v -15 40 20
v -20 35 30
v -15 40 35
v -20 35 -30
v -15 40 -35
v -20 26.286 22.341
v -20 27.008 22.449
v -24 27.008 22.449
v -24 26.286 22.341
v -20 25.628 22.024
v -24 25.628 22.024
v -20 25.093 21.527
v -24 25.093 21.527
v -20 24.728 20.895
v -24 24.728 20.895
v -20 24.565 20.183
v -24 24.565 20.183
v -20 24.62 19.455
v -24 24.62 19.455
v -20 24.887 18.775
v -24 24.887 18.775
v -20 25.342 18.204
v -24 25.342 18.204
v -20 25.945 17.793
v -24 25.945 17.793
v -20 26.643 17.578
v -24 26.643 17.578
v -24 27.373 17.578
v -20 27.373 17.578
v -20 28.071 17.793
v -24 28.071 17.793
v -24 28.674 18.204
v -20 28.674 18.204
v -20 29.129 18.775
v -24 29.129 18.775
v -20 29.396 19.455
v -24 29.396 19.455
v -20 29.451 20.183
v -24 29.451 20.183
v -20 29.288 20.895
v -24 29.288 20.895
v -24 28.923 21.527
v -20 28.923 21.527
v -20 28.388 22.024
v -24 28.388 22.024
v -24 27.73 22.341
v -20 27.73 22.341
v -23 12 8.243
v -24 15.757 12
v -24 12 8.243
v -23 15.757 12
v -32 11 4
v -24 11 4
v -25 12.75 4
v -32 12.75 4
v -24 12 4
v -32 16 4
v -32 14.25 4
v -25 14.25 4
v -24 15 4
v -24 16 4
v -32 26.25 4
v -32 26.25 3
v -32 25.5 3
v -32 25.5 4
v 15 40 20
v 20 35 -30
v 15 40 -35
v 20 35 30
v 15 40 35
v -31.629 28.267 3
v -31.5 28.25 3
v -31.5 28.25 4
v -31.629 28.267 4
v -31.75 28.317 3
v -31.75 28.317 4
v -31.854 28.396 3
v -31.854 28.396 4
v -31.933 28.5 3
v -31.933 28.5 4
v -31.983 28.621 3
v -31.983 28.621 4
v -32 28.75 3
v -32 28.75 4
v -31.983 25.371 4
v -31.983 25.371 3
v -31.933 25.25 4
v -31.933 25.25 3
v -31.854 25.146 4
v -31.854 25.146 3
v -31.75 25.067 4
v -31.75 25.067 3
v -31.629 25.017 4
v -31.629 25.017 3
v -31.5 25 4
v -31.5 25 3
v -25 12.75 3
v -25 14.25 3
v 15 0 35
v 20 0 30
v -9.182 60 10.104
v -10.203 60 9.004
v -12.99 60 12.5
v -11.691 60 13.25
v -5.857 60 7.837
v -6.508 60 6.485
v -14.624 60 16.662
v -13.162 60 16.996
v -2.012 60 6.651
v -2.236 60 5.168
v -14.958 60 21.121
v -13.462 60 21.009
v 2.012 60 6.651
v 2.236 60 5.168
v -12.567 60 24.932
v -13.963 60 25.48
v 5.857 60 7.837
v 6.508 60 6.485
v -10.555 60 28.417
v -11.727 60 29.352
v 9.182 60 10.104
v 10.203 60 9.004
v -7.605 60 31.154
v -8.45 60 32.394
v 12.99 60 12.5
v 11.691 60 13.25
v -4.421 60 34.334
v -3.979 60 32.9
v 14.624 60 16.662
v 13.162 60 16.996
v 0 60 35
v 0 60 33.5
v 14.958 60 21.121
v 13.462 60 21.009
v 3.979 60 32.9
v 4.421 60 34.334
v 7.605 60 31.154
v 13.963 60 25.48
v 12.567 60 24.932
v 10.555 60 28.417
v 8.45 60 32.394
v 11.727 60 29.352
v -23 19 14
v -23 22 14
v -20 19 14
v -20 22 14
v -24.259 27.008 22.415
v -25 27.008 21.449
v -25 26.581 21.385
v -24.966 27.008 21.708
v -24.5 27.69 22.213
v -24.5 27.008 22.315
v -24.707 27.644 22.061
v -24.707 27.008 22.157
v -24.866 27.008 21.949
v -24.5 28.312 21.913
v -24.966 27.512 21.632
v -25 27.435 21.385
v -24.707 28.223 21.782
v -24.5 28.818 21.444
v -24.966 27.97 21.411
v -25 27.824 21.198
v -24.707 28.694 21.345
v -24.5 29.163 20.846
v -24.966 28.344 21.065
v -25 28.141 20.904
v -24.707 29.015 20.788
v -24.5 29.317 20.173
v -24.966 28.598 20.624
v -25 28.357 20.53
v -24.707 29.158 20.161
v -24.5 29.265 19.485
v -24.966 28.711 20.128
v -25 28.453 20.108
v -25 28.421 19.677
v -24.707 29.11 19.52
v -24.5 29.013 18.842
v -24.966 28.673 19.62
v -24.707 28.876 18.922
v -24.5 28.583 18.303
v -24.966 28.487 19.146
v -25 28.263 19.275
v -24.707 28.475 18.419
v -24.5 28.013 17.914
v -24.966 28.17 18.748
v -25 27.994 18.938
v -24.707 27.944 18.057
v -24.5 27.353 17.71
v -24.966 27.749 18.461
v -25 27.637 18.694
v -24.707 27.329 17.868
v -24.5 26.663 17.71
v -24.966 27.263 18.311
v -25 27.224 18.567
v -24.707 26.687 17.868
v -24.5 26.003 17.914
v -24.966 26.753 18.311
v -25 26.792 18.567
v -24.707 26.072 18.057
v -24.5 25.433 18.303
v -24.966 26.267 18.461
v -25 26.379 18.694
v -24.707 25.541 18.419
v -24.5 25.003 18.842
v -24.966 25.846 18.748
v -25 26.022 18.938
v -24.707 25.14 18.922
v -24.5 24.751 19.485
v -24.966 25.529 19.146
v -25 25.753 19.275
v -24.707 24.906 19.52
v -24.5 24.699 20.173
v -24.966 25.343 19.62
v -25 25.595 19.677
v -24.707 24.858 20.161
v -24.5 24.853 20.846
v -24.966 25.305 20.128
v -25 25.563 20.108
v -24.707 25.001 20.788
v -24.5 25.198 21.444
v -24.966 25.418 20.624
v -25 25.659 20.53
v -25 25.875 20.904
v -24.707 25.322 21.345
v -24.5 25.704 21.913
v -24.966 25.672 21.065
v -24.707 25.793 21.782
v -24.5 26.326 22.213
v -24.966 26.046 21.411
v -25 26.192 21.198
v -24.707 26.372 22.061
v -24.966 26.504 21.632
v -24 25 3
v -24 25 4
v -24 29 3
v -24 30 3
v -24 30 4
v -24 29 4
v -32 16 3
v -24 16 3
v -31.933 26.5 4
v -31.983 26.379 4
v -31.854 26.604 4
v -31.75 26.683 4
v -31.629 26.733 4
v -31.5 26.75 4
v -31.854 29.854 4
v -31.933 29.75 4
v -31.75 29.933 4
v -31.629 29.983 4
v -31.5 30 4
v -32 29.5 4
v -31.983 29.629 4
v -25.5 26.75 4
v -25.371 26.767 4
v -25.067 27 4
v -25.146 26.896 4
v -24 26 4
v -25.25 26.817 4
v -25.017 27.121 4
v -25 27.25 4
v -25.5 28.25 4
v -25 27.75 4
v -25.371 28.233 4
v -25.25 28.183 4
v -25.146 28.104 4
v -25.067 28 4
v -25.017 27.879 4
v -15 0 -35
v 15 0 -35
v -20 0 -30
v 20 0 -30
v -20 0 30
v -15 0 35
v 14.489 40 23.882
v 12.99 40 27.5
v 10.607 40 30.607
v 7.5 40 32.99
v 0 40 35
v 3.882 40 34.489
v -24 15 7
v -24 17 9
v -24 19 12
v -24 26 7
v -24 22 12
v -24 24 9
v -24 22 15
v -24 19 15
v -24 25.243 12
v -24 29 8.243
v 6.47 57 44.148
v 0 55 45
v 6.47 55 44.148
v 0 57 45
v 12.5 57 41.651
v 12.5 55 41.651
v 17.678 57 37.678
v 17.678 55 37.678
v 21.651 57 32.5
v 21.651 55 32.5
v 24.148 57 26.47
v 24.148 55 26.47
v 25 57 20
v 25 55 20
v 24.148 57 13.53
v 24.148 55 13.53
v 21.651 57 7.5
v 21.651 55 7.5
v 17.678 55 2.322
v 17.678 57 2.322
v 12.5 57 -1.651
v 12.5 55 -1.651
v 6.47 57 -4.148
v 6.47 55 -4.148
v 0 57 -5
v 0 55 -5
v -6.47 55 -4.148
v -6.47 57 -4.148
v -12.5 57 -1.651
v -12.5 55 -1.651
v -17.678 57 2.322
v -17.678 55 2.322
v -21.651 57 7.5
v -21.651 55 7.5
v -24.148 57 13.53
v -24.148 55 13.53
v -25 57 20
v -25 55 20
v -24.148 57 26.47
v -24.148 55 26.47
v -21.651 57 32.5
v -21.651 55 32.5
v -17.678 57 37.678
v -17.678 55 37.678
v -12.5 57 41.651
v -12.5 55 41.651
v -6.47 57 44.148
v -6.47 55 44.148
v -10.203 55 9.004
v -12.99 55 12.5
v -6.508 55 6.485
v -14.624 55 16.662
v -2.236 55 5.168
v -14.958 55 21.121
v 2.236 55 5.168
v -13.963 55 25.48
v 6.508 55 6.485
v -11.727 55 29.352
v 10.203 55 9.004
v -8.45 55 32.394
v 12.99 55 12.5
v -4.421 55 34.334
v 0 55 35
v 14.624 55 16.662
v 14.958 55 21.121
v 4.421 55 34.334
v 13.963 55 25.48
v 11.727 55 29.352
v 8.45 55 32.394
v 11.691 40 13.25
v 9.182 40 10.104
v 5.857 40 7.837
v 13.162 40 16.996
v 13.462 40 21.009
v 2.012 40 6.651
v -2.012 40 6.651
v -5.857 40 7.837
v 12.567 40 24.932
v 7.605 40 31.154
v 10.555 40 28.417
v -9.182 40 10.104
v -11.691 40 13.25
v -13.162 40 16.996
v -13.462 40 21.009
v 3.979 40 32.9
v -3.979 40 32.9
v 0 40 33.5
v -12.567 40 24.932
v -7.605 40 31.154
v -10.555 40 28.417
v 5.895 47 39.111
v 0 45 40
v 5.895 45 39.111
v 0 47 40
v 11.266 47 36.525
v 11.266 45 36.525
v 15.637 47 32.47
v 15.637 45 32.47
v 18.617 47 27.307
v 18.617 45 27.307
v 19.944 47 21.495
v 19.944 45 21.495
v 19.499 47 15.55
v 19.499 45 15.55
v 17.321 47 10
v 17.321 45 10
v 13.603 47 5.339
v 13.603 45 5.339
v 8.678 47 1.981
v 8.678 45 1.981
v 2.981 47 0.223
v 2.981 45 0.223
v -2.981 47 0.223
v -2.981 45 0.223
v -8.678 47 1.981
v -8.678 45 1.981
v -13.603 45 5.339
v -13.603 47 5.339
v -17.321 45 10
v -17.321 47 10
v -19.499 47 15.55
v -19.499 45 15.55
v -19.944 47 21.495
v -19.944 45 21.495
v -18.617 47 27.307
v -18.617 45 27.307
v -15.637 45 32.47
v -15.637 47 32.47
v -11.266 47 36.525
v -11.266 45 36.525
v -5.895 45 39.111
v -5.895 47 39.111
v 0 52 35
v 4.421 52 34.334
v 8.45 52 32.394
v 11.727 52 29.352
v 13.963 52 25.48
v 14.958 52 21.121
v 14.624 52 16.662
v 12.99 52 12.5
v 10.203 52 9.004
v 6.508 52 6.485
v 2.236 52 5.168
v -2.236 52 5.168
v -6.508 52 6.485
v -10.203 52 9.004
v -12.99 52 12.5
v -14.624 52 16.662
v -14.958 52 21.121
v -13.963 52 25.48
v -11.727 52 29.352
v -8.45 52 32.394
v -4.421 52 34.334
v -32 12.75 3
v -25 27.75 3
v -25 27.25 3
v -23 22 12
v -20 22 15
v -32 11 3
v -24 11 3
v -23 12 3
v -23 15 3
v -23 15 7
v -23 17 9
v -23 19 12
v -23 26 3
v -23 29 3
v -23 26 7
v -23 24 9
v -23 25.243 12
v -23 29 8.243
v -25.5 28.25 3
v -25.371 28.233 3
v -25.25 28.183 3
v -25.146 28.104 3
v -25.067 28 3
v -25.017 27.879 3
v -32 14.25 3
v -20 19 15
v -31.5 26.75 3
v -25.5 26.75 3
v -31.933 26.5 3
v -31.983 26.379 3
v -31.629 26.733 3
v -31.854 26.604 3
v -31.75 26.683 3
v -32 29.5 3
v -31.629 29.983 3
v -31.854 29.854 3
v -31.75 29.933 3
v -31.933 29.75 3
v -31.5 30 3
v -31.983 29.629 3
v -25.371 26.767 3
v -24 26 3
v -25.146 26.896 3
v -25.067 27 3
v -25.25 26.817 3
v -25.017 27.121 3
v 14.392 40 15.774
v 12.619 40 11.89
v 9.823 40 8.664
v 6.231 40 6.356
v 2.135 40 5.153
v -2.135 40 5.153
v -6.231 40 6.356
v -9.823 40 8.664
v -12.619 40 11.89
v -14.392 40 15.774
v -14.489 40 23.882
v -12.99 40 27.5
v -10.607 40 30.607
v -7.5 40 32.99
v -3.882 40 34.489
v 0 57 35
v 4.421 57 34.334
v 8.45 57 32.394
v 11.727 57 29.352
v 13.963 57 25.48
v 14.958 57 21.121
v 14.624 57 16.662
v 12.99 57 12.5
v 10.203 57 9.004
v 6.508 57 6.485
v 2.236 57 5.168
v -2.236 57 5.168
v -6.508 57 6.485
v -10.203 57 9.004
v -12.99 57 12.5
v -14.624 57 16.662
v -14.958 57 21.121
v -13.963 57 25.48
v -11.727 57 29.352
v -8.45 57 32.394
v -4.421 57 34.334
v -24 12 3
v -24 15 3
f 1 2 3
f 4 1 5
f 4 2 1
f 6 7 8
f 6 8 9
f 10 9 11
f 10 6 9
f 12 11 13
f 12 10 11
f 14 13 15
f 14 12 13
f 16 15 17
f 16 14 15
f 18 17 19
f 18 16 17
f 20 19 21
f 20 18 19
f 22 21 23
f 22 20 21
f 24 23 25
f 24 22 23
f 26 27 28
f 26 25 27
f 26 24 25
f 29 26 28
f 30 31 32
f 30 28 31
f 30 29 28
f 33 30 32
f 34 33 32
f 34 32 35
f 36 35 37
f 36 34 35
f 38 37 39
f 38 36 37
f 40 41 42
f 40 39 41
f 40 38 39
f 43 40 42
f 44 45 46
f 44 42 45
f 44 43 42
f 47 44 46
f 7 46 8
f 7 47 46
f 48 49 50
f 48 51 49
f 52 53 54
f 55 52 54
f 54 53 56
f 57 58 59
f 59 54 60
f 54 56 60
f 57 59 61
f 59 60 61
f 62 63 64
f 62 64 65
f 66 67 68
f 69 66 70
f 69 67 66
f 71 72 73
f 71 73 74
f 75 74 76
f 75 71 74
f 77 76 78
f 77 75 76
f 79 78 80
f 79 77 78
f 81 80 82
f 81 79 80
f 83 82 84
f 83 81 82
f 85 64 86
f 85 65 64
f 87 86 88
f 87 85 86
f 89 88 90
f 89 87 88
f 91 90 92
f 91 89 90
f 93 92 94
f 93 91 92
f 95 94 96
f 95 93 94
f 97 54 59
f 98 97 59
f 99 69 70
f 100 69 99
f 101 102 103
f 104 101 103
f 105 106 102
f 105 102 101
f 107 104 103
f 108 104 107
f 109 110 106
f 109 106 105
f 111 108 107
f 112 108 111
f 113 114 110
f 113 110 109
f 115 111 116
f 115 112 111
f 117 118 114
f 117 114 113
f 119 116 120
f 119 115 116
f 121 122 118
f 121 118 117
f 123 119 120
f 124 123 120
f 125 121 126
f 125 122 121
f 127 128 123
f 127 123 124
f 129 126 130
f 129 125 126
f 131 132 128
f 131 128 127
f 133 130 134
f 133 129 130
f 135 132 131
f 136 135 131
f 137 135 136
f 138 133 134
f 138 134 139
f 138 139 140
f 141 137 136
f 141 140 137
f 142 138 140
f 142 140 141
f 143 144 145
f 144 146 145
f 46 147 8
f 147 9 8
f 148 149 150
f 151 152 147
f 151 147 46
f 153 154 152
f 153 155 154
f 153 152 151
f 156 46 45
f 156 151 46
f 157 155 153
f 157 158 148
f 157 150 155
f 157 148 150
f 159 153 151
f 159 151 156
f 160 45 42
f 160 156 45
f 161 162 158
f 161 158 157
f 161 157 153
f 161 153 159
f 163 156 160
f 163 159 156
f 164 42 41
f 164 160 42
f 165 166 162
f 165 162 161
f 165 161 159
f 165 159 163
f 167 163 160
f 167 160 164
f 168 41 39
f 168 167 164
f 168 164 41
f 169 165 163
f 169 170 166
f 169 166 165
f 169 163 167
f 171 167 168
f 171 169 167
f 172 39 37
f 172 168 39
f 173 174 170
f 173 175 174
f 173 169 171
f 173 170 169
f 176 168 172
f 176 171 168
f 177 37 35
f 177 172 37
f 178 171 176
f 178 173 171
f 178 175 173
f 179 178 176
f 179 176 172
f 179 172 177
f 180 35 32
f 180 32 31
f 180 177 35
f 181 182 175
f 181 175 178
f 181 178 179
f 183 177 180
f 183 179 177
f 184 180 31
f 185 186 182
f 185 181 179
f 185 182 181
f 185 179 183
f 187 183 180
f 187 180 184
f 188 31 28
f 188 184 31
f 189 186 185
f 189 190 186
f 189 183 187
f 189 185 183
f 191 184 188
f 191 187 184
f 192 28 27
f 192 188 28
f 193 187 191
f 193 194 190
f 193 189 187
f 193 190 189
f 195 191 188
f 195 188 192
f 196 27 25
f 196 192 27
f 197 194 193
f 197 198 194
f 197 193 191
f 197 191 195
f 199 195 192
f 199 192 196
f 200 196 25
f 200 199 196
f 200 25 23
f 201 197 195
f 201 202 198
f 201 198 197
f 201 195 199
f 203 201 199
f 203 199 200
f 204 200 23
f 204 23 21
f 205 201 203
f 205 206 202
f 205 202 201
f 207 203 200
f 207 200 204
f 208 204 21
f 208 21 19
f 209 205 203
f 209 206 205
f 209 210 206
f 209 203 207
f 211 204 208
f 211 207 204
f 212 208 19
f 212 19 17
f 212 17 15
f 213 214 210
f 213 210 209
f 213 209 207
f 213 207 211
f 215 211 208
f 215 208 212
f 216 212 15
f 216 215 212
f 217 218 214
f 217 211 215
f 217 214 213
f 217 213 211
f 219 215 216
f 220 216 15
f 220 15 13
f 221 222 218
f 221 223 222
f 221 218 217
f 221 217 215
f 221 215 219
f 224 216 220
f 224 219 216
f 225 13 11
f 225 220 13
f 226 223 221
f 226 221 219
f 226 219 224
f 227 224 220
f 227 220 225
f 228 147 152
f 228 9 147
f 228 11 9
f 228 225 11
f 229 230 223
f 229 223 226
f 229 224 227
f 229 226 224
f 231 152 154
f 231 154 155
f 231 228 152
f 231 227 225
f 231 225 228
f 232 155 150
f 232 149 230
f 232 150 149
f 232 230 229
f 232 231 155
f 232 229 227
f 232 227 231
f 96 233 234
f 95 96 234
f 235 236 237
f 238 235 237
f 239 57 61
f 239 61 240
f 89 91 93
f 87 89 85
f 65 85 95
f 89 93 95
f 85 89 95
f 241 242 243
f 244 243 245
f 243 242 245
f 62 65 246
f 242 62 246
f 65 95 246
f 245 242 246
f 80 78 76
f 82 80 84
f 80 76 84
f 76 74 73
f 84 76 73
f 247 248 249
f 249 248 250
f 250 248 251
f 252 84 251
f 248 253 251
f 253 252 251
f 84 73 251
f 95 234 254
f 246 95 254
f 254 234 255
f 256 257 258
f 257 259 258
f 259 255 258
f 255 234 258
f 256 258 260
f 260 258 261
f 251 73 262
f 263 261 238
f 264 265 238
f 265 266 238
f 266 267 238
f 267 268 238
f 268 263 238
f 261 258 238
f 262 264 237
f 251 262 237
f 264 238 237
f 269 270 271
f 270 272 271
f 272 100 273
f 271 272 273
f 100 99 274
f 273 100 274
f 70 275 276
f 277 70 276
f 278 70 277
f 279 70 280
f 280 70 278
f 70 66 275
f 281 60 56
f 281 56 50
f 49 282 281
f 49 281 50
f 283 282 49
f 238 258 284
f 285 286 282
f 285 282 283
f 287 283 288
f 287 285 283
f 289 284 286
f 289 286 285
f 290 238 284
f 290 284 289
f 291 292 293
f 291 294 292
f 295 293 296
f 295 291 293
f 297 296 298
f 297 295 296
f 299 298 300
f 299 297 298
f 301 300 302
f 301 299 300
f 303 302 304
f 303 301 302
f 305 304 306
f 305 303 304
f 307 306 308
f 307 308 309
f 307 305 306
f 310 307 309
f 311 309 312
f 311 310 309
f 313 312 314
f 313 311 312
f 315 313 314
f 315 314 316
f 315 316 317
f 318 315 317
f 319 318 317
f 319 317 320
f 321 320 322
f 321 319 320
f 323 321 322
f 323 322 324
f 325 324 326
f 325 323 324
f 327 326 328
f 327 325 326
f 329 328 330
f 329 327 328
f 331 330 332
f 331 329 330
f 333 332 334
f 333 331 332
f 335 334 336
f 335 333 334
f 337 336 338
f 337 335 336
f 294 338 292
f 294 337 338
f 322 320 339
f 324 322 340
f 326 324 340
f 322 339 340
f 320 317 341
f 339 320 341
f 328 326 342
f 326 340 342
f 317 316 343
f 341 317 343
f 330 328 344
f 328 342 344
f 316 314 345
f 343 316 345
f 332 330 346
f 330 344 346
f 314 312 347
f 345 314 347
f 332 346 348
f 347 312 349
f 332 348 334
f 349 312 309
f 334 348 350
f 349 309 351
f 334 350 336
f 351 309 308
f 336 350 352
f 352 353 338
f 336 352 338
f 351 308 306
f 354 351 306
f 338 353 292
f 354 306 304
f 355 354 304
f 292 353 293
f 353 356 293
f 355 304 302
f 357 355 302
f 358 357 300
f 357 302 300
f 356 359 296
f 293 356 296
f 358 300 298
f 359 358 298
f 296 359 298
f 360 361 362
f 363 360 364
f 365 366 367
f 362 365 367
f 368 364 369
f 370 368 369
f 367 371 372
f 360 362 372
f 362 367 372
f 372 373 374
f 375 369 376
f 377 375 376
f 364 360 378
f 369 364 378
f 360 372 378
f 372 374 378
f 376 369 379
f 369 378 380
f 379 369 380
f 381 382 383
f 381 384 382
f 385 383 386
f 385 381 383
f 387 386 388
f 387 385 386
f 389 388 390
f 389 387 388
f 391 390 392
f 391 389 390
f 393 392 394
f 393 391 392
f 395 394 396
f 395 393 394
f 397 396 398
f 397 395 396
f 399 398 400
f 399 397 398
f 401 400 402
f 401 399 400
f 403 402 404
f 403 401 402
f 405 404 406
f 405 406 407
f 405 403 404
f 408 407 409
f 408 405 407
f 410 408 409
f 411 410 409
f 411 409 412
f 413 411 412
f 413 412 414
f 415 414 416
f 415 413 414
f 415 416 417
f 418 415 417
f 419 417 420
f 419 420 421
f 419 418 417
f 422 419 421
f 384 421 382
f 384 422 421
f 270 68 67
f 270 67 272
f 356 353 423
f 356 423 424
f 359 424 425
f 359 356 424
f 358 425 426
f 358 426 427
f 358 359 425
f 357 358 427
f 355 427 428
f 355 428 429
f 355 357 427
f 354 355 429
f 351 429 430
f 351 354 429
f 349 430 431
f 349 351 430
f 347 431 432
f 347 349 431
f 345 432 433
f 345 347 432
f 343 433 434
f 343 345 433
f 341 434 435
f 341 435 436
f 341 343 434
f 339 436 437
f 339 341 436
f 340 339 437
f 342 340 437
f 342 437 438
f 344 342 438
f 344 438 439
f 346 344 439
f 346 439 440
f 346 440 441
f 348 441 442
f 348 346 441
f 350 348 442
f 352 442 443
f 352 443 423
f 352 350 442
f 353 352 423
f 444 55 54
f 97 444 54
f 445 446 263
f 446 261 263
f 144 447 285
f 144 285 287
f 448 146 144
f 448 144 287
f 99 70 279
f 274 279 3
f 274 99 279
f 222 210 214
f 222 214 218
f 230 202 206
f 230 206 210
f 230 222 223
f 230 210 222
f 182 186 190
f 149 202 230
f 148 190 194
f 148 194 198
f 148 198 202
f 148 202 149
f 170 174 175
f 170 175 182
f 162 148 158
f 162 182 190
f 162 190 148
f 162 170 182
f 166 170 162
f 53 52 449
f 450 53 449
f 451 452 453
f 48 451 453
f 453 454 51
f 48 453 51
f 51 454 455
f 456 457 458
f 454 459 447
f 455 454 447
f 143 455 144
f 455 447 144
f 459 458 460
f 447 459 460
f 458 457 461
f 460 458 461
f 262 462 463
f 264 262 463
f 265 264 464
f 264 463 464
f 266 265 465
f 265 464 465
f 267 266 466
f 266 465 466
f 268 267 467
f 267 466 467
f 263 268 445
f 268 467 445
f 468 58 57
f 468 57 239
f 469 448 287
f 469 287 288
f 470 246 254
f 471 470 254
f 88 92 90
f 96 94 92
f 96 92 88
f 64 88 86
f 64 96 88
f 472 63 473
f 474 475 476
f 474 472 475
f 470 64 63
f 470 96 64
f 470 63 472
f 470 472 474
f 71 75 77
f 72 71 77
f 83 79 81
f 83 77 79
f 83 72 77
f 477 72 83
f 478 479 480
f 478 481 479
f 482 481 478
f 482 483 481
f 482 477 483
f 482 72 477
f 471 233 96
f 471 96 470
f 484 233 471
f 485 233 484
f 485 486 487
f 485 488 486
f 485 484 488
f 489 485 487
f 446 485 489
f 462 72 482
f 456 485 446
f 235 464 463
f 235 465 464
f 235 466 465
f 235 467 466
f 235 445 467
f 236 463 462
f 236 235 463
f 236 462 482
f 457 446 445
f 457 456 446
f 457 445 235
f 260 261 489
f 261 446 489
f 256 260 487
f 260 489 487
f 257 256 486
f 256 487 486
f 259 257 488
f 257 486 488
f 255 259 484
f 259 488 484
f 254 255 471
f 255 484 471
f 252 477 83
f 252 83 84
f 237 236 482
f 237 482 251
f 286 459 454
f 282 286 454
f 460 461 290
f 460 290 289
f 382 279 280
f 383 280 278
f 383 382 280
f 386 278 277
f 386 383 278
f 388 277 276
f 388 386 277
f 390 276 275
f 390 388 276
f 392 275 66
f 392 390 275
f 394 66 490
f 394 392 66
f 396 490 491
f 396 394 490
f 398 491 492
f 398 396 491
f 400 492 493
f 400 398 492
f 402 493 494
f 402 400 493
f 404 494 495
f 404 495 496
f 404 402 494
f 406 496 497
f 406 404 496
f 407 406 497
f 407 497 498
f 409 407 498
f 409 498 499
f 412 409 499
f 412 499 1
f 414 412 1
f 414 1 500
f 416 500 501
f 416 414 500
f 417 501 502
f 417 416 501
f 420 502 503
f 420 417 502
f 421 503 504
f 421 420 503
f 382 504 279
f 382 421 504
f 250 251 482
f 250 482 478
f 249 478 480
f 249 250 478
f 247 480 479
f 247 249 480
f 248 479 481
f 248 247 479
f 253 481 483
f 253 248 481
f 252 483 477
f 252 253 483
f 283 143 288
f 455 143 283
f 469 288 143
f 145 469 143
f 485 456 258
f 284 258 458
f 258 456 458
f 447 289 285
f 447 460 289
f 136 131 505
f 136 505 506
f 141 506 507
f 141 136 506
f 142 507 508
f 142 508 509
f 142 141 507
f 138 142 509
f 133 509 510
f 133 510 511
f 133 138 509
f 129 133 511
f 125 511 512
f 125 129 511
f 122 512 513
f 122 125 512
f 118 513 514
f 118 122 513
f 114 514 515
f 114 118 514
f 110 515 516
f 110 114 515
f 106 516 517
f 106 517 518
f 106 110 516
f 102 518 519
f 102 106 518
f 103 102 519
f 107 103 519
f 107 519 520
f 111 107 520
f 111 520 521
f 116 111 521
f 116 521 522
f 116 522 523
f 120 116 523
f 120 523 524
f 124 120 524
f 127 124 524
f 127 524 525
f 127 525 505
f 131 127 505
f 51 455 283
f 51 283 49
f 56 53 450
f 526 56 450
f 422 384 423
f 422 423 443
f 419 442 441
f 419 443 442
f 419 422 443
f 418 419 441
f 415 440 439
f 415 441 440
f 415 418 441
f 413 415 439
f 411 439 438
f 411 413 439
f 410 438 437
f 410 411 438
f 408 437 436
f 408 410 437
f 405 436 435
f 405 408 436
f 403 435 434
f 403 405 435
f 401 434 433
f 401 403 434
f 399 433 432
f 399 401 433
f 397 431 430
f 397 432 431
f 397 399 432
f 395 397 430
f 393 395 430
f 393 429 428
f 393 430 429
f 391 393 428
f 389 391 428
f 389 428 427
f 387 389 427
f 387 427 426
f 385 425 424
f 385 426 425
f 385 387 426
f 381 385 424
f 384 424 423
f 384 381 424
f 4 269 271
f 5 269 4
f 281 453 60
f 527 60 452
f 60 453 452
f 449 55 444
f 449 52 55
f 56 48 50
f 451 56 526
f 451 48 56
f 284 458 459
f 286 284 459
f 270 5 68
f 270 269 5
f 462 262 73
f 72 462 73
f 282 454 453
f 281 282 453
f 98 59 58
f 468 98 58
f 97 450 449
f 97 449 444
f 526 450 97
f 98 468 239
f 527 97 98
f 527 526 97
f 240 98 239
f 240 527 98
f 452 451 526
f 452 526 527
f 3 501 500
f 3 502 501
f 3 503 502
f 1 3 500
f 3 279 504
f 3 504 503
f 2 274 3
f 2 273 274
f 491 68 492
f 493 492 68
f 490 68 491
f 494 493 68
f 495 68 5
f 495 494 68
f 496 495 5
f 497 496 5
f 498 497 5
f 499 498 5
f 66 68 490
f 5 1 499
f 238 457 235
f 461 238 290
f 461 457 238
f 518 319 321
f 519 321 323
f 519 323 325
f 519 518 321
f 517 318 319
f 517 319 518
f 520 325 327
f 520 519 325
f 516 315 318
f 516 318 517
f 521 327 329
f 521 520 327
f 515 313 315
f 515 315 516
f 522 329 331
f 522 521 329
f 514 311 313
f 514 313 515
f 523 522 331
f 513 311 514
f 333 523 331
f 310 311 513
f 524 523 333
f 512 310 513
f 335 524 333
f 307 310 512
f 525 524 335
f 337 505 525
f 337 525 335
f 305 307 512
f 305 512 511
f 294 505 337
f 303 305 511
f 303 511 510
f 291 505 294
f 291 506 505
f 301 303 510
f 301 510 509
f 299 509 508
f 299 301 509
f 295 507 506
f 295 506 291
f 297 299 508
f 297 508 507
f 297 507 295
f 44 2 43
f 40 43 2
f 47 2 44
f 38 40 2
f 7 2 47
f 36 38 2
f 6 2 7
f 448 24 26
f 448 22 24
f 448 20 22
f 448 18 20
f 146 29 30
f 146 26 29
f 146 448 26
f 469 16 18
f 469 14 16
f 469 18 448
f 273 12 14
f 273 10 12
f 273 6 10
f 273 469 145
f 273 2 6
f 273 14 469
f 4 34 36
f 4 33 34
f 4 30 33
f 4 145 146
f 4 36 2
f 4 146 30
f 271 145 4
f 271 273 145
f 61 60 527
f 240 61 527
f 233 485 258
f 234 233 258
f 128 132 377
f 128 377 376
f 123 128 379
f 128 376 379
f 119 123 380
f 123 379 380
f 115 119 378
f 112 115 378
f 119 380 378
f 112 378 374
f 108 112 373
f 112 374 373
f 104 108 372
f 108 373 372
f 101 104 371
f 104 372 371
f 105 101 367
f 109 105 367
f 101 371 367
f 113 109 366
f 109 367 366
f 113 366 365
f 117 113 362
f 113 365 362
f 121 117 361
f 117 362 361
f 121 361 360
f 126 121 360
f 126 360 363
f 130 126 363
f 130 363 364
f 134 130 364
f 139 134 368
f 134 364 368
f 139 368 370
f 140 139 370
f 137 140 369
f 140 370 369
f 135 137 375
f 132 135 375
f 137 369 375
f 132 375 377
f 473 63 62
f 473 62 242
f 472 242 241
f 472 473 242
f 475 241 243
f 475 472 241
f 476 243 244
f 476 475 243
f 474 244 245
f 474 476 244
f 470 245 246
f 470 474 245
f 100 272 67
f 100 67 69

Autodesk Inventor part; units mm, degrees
sketch "Sketch1" plane through (0, 0, 0) normal (0, 1, 0) x (-1, 0, 0)
  line L0 (-20, 35) -> (20, 35)
  line L1 (20, 35) -> (20, -35)
  line L2 (20, -35) -> (-20, -35)
  line L3 (-20, -35) -> (-20, 35)
  line L4 (-20, 35) -> (20, -35) construction
  line L5 (20, 35) -> (-20, -35) construction
  line L6 (-17.5, 35) -> (17.5, 35)
  line L7 (17.5, 35) -> (17.5, -35)
  line L8 (17.5, -35) -> (-17.5, -35)
  line L9 (-17.5, -35) -> (-17.5, 35)
  line L10 (-17.5, 35) -> (17.5, -35) construction
  line L11 (17.5, 35) -> (-17.5, -35) construction
  line L12 (-20, 20) -> (20, 20)
  line L13 (20, 20) -> (20, -20)
  line L14 (20, -20) -> (-20, -20)
  line L15 (-20, -20) -> (-20, 20)
  line L16 (-20, 20) -> (20, -20) construction
  line L17 (20, 20) -> (-20, -20) construction
  point P0 (0, 0)
  dimension "d0" = 40
  dimension "d1" = 70
  dimension "d2" = 40
  dimension "d3" = 35
extrude "Extrusion1" add sketch "Sketch1" along normal blind 40
chamfer "Chamfer1" distance 5 angle 45 4 edges at (20, 20, 35) (-20, 20, 35) (-20, 20, -35) (20, 20, -35)
ref_plane "Work Plane1" through (0, 10, 0) normal (0, -1, 0) x (1, 0, 0)
chamfer "Chamfer2" distance 5 angle 45 2 edges at (20, 40, 0) (-20, 40, 0)
ref_plane "Work Plane3" through (0, 0, 30) normal (1, 0, 0) x (0, 0, -1)
sketch "Sketch5" plane through (0, 0, 30) normal (1, 0, 0) x (0, 0, -1)
  point P0 (30, 0)
sketch "Sketch6" plane through (0, 10, 0) normal (0, -1, 0) x (1, 0, 0)
  point P0 (0, 0)
sketch "Sketch7" plane through (0, 0, 30) normal (1, 0, 0) x (0, 0, -1)
  line L0 (-5, 40) -> (65, 40) projected
  line L1 (10, 40) -> (10, 60)
  line L2 (-5, 0) -> (-5, 40) projected
  line L3 (-5, 40) -> (-10, 45)
  line L4 (-10, 45) -> (-10, 47)
  line L5 (-10, 47) -> (-5, 52)
  line L6 (-5, 52) -> (-5, 55)
  line L7 (-5, 55) -> (-15, 55)
  line L8 (-5, 57) -> (-5, 60)
  line L9 (-5, 60) -> (10, 60)
  line L10 (-15, 57) -> (-5, 57)
  line L11 (-15, 55) -> (-15, 57)
  point P0 (30, 0)
  point P1 (-10, 46)
  point P2 (-22, 56)
  point P3 (-5, 58.5)
  point P4 (-5, 53.5)
  point P5 (-15, 56)
  point P6 (-10, 57)
  dimension "d34" = 20
  dimension "d35" = 15
  dimension "d37" = 12
  dimension "d39" = 5
  dimension "d40" = 2
  dimension "d42" = 40
  dimension "d43" = 64
  dimension "d44" = 30
  dimension "d45" = 30
  dimension "d46" = 50
  dimension "d47" = 2
  dimension "d48" = 3
revolve "Revolution2" add sketch "Sketch7" angle 360 about axis through (0, 40, 20) along (0, 1, 0)
sketch "Sketch8" plane through (0, 60, 20) normal (0, 1, 0) x (1, 0, 0)
  point P0 (0, 20)
  point P1 (0, 0)
hole "Hole1" at (0, 60, 20) direction (0, -1, 0) diameter 27 depth 20
sketch "Sketch9" plane through (-20, 0, -30) normal (-1, 0, 0) x (0, 0, 1)
  circle A0 centre (50, 27.008) radius 2.4494
  point P0 (30, 0)
extrude "Extrusion4" add sketch "Sketch9" along normal blind 5
fillet "Fillet1" radius 1 1 edges at (-25, 27.008, 17.5506)
sketch "Sketch10" plane through (-20, 0, -30) normal (-1, 0, 0) x (0, 0, 1)
  line L0 (33, 29) -> (45, 29)
  line L1 (45, 29) -> (45, 19)
  line L2 (45, 19) -> (33, 19)
  line L3 (33, 19) -> (33, 29)
  line L4 (33, 26) -> (37, 26)
  line L5 (39, 24) -> (39, 19)
  line L6 (60, 35) -> (60, 0) projected
  line L7 (0, 35) -> (60, 35) projected
  line L8 (37, 26) -> (39, 24)
  line L9 (38.2426, 29) -> (45, 22.2426)
  line L10 (42, 30.25) -> (42, 15.4606)
  line L11 (38, 22) -> (48.4916, 22)
  line L12 (44, 22) -> (44, 19)
  point P0 (30, 0)
  point P1 (39, 26)
  point P2 (39, 21.5)
  point P3 (39, 29)
  point P4 (45, 24)
  point P5 (38, 25)
  point P6 (45, 22)
  point P7 (42, 22)
  point P8 (42, 25.2426)
  dimension "d60" = 6
  dimension "d61" = 10
  dimension "d62" = 12
  dimension "d63" = 15
  dimension "d64" = 16
  dimension "d65" = 3
  dimension "d66" = 2
  dimension "d67" = 2
  dimension "d68" = 3
  dimension "d69" = 3
  dimension "d70" = 3
  dimension "d73" = 1
extrude "Extrusion5" add sketch "Sketch10" along normal blind 4 contours L0 L9 L10 L11 L5 L8 L4 L3 | L11 L12 L2 L10 | L10 L2 L5 L11 | L1 L2 L12 L11
extrude "Extrusion6" cut sketch "Sketch10" along normal blind 3 contours L0 L9 L10 L11 L5 L8 L4 L3 | L11 L12 L2 L10 | L10 L2 L5 L11
sketch "Sketch11" plane through (-24, 0, -30) normal (-1, 0, 0) x (0, 0, 1)
  line L0 (33, 29) -> (33, 26) projected
  line L1 (38.2426, 29) -> (33, 29) projected
  line L2 (34, 26) -> (34, 29)
  line L3 (33, 29) -> (33, 26)
  line L4 (33, 26) -> (33, 25)
  line L5 (33, 25) -> (34, 25)
  line L6 (34, 25) -> (34, 26)
  line L7 (33, 30) -> (34, 30)
  line L8 (33, 29) -> (33, 30)
  line L9 (34, 30) -> (34, 29)
  point P0 (30, 0)
  point P1 (33.5, 25)
  dimension "d76" = 1
extrude "Extrusion7" add sketch "Sketch11" along normal blind 8
sketch "Sketch12" plane through (-24, 25, 4) normal (0, 0, 1) x (1, 0, 0)
  line L0 (-8.9741, 1.75) -> (-1, 1.75)
  line L1 (-1, 1.75) -> (-1, 3.25)
  line L2 (-1, 3.25) -> (-8.9741, 3.25)
  line L3 (-8.9741, 3.25) -> (-8.9741, 1.75)
  line L4 (0, 0) -> (-8, 0) projected
  line L5 (-8, 0) -> (-8, 5) projected
  point P0 (24, -25)
  point P1 (-8, 3.25)
  point P2 (-8, 1.75)
  dimension "d80" = 1.5
  dimension "d81" = 1.75
  dimension "d82" = 7
extrude "Extrusion8" cut sketch "Sketch12" against normal blind 8 contours L5 L2 L1 L0
fillet "Fillet2" radius 0.5 6 edges at (-32, 25, 3.5) (-32, 30, 3.5) (-32, 26.75, 3.5) (-32, 28.25, 3.5) (-25, 28.25, 3.5) (-25, 26.75, 3.5)
sketch "Sketch13" plane through (-20, 0, -30) normal (-1, 0, 0) x (0, 0, 1)
  point P0 (30, 0)
sketch "Sketch14" plane through (-20, 0, -30) normal (-1, 0, 0) x (0, 0, 1)
  line L0 (0, 35) -> (0, 0) projected
  line L1 (60, 0) -> (60, 35) projected
  point P0 (30, 0)
sketch "Sketch15" plane through (-24, 0, -30) normal (-1, 0, 0) x (0, 0, 1)
  point P0 (30, 0)
ref_plane "Work Plane4" through (-24, 20.5, 15) normal (0, -1, 0) x (1, 0, 0)
mirror "Mirror2" about plane through (-24, 20.5, 15) normal (0, -1, 0) of "Extrusion5", "Extrusion6", "Extrusion7", "Extrusion8"
equation "\"d67\" = d66"
properties material "ABS Plastic"
